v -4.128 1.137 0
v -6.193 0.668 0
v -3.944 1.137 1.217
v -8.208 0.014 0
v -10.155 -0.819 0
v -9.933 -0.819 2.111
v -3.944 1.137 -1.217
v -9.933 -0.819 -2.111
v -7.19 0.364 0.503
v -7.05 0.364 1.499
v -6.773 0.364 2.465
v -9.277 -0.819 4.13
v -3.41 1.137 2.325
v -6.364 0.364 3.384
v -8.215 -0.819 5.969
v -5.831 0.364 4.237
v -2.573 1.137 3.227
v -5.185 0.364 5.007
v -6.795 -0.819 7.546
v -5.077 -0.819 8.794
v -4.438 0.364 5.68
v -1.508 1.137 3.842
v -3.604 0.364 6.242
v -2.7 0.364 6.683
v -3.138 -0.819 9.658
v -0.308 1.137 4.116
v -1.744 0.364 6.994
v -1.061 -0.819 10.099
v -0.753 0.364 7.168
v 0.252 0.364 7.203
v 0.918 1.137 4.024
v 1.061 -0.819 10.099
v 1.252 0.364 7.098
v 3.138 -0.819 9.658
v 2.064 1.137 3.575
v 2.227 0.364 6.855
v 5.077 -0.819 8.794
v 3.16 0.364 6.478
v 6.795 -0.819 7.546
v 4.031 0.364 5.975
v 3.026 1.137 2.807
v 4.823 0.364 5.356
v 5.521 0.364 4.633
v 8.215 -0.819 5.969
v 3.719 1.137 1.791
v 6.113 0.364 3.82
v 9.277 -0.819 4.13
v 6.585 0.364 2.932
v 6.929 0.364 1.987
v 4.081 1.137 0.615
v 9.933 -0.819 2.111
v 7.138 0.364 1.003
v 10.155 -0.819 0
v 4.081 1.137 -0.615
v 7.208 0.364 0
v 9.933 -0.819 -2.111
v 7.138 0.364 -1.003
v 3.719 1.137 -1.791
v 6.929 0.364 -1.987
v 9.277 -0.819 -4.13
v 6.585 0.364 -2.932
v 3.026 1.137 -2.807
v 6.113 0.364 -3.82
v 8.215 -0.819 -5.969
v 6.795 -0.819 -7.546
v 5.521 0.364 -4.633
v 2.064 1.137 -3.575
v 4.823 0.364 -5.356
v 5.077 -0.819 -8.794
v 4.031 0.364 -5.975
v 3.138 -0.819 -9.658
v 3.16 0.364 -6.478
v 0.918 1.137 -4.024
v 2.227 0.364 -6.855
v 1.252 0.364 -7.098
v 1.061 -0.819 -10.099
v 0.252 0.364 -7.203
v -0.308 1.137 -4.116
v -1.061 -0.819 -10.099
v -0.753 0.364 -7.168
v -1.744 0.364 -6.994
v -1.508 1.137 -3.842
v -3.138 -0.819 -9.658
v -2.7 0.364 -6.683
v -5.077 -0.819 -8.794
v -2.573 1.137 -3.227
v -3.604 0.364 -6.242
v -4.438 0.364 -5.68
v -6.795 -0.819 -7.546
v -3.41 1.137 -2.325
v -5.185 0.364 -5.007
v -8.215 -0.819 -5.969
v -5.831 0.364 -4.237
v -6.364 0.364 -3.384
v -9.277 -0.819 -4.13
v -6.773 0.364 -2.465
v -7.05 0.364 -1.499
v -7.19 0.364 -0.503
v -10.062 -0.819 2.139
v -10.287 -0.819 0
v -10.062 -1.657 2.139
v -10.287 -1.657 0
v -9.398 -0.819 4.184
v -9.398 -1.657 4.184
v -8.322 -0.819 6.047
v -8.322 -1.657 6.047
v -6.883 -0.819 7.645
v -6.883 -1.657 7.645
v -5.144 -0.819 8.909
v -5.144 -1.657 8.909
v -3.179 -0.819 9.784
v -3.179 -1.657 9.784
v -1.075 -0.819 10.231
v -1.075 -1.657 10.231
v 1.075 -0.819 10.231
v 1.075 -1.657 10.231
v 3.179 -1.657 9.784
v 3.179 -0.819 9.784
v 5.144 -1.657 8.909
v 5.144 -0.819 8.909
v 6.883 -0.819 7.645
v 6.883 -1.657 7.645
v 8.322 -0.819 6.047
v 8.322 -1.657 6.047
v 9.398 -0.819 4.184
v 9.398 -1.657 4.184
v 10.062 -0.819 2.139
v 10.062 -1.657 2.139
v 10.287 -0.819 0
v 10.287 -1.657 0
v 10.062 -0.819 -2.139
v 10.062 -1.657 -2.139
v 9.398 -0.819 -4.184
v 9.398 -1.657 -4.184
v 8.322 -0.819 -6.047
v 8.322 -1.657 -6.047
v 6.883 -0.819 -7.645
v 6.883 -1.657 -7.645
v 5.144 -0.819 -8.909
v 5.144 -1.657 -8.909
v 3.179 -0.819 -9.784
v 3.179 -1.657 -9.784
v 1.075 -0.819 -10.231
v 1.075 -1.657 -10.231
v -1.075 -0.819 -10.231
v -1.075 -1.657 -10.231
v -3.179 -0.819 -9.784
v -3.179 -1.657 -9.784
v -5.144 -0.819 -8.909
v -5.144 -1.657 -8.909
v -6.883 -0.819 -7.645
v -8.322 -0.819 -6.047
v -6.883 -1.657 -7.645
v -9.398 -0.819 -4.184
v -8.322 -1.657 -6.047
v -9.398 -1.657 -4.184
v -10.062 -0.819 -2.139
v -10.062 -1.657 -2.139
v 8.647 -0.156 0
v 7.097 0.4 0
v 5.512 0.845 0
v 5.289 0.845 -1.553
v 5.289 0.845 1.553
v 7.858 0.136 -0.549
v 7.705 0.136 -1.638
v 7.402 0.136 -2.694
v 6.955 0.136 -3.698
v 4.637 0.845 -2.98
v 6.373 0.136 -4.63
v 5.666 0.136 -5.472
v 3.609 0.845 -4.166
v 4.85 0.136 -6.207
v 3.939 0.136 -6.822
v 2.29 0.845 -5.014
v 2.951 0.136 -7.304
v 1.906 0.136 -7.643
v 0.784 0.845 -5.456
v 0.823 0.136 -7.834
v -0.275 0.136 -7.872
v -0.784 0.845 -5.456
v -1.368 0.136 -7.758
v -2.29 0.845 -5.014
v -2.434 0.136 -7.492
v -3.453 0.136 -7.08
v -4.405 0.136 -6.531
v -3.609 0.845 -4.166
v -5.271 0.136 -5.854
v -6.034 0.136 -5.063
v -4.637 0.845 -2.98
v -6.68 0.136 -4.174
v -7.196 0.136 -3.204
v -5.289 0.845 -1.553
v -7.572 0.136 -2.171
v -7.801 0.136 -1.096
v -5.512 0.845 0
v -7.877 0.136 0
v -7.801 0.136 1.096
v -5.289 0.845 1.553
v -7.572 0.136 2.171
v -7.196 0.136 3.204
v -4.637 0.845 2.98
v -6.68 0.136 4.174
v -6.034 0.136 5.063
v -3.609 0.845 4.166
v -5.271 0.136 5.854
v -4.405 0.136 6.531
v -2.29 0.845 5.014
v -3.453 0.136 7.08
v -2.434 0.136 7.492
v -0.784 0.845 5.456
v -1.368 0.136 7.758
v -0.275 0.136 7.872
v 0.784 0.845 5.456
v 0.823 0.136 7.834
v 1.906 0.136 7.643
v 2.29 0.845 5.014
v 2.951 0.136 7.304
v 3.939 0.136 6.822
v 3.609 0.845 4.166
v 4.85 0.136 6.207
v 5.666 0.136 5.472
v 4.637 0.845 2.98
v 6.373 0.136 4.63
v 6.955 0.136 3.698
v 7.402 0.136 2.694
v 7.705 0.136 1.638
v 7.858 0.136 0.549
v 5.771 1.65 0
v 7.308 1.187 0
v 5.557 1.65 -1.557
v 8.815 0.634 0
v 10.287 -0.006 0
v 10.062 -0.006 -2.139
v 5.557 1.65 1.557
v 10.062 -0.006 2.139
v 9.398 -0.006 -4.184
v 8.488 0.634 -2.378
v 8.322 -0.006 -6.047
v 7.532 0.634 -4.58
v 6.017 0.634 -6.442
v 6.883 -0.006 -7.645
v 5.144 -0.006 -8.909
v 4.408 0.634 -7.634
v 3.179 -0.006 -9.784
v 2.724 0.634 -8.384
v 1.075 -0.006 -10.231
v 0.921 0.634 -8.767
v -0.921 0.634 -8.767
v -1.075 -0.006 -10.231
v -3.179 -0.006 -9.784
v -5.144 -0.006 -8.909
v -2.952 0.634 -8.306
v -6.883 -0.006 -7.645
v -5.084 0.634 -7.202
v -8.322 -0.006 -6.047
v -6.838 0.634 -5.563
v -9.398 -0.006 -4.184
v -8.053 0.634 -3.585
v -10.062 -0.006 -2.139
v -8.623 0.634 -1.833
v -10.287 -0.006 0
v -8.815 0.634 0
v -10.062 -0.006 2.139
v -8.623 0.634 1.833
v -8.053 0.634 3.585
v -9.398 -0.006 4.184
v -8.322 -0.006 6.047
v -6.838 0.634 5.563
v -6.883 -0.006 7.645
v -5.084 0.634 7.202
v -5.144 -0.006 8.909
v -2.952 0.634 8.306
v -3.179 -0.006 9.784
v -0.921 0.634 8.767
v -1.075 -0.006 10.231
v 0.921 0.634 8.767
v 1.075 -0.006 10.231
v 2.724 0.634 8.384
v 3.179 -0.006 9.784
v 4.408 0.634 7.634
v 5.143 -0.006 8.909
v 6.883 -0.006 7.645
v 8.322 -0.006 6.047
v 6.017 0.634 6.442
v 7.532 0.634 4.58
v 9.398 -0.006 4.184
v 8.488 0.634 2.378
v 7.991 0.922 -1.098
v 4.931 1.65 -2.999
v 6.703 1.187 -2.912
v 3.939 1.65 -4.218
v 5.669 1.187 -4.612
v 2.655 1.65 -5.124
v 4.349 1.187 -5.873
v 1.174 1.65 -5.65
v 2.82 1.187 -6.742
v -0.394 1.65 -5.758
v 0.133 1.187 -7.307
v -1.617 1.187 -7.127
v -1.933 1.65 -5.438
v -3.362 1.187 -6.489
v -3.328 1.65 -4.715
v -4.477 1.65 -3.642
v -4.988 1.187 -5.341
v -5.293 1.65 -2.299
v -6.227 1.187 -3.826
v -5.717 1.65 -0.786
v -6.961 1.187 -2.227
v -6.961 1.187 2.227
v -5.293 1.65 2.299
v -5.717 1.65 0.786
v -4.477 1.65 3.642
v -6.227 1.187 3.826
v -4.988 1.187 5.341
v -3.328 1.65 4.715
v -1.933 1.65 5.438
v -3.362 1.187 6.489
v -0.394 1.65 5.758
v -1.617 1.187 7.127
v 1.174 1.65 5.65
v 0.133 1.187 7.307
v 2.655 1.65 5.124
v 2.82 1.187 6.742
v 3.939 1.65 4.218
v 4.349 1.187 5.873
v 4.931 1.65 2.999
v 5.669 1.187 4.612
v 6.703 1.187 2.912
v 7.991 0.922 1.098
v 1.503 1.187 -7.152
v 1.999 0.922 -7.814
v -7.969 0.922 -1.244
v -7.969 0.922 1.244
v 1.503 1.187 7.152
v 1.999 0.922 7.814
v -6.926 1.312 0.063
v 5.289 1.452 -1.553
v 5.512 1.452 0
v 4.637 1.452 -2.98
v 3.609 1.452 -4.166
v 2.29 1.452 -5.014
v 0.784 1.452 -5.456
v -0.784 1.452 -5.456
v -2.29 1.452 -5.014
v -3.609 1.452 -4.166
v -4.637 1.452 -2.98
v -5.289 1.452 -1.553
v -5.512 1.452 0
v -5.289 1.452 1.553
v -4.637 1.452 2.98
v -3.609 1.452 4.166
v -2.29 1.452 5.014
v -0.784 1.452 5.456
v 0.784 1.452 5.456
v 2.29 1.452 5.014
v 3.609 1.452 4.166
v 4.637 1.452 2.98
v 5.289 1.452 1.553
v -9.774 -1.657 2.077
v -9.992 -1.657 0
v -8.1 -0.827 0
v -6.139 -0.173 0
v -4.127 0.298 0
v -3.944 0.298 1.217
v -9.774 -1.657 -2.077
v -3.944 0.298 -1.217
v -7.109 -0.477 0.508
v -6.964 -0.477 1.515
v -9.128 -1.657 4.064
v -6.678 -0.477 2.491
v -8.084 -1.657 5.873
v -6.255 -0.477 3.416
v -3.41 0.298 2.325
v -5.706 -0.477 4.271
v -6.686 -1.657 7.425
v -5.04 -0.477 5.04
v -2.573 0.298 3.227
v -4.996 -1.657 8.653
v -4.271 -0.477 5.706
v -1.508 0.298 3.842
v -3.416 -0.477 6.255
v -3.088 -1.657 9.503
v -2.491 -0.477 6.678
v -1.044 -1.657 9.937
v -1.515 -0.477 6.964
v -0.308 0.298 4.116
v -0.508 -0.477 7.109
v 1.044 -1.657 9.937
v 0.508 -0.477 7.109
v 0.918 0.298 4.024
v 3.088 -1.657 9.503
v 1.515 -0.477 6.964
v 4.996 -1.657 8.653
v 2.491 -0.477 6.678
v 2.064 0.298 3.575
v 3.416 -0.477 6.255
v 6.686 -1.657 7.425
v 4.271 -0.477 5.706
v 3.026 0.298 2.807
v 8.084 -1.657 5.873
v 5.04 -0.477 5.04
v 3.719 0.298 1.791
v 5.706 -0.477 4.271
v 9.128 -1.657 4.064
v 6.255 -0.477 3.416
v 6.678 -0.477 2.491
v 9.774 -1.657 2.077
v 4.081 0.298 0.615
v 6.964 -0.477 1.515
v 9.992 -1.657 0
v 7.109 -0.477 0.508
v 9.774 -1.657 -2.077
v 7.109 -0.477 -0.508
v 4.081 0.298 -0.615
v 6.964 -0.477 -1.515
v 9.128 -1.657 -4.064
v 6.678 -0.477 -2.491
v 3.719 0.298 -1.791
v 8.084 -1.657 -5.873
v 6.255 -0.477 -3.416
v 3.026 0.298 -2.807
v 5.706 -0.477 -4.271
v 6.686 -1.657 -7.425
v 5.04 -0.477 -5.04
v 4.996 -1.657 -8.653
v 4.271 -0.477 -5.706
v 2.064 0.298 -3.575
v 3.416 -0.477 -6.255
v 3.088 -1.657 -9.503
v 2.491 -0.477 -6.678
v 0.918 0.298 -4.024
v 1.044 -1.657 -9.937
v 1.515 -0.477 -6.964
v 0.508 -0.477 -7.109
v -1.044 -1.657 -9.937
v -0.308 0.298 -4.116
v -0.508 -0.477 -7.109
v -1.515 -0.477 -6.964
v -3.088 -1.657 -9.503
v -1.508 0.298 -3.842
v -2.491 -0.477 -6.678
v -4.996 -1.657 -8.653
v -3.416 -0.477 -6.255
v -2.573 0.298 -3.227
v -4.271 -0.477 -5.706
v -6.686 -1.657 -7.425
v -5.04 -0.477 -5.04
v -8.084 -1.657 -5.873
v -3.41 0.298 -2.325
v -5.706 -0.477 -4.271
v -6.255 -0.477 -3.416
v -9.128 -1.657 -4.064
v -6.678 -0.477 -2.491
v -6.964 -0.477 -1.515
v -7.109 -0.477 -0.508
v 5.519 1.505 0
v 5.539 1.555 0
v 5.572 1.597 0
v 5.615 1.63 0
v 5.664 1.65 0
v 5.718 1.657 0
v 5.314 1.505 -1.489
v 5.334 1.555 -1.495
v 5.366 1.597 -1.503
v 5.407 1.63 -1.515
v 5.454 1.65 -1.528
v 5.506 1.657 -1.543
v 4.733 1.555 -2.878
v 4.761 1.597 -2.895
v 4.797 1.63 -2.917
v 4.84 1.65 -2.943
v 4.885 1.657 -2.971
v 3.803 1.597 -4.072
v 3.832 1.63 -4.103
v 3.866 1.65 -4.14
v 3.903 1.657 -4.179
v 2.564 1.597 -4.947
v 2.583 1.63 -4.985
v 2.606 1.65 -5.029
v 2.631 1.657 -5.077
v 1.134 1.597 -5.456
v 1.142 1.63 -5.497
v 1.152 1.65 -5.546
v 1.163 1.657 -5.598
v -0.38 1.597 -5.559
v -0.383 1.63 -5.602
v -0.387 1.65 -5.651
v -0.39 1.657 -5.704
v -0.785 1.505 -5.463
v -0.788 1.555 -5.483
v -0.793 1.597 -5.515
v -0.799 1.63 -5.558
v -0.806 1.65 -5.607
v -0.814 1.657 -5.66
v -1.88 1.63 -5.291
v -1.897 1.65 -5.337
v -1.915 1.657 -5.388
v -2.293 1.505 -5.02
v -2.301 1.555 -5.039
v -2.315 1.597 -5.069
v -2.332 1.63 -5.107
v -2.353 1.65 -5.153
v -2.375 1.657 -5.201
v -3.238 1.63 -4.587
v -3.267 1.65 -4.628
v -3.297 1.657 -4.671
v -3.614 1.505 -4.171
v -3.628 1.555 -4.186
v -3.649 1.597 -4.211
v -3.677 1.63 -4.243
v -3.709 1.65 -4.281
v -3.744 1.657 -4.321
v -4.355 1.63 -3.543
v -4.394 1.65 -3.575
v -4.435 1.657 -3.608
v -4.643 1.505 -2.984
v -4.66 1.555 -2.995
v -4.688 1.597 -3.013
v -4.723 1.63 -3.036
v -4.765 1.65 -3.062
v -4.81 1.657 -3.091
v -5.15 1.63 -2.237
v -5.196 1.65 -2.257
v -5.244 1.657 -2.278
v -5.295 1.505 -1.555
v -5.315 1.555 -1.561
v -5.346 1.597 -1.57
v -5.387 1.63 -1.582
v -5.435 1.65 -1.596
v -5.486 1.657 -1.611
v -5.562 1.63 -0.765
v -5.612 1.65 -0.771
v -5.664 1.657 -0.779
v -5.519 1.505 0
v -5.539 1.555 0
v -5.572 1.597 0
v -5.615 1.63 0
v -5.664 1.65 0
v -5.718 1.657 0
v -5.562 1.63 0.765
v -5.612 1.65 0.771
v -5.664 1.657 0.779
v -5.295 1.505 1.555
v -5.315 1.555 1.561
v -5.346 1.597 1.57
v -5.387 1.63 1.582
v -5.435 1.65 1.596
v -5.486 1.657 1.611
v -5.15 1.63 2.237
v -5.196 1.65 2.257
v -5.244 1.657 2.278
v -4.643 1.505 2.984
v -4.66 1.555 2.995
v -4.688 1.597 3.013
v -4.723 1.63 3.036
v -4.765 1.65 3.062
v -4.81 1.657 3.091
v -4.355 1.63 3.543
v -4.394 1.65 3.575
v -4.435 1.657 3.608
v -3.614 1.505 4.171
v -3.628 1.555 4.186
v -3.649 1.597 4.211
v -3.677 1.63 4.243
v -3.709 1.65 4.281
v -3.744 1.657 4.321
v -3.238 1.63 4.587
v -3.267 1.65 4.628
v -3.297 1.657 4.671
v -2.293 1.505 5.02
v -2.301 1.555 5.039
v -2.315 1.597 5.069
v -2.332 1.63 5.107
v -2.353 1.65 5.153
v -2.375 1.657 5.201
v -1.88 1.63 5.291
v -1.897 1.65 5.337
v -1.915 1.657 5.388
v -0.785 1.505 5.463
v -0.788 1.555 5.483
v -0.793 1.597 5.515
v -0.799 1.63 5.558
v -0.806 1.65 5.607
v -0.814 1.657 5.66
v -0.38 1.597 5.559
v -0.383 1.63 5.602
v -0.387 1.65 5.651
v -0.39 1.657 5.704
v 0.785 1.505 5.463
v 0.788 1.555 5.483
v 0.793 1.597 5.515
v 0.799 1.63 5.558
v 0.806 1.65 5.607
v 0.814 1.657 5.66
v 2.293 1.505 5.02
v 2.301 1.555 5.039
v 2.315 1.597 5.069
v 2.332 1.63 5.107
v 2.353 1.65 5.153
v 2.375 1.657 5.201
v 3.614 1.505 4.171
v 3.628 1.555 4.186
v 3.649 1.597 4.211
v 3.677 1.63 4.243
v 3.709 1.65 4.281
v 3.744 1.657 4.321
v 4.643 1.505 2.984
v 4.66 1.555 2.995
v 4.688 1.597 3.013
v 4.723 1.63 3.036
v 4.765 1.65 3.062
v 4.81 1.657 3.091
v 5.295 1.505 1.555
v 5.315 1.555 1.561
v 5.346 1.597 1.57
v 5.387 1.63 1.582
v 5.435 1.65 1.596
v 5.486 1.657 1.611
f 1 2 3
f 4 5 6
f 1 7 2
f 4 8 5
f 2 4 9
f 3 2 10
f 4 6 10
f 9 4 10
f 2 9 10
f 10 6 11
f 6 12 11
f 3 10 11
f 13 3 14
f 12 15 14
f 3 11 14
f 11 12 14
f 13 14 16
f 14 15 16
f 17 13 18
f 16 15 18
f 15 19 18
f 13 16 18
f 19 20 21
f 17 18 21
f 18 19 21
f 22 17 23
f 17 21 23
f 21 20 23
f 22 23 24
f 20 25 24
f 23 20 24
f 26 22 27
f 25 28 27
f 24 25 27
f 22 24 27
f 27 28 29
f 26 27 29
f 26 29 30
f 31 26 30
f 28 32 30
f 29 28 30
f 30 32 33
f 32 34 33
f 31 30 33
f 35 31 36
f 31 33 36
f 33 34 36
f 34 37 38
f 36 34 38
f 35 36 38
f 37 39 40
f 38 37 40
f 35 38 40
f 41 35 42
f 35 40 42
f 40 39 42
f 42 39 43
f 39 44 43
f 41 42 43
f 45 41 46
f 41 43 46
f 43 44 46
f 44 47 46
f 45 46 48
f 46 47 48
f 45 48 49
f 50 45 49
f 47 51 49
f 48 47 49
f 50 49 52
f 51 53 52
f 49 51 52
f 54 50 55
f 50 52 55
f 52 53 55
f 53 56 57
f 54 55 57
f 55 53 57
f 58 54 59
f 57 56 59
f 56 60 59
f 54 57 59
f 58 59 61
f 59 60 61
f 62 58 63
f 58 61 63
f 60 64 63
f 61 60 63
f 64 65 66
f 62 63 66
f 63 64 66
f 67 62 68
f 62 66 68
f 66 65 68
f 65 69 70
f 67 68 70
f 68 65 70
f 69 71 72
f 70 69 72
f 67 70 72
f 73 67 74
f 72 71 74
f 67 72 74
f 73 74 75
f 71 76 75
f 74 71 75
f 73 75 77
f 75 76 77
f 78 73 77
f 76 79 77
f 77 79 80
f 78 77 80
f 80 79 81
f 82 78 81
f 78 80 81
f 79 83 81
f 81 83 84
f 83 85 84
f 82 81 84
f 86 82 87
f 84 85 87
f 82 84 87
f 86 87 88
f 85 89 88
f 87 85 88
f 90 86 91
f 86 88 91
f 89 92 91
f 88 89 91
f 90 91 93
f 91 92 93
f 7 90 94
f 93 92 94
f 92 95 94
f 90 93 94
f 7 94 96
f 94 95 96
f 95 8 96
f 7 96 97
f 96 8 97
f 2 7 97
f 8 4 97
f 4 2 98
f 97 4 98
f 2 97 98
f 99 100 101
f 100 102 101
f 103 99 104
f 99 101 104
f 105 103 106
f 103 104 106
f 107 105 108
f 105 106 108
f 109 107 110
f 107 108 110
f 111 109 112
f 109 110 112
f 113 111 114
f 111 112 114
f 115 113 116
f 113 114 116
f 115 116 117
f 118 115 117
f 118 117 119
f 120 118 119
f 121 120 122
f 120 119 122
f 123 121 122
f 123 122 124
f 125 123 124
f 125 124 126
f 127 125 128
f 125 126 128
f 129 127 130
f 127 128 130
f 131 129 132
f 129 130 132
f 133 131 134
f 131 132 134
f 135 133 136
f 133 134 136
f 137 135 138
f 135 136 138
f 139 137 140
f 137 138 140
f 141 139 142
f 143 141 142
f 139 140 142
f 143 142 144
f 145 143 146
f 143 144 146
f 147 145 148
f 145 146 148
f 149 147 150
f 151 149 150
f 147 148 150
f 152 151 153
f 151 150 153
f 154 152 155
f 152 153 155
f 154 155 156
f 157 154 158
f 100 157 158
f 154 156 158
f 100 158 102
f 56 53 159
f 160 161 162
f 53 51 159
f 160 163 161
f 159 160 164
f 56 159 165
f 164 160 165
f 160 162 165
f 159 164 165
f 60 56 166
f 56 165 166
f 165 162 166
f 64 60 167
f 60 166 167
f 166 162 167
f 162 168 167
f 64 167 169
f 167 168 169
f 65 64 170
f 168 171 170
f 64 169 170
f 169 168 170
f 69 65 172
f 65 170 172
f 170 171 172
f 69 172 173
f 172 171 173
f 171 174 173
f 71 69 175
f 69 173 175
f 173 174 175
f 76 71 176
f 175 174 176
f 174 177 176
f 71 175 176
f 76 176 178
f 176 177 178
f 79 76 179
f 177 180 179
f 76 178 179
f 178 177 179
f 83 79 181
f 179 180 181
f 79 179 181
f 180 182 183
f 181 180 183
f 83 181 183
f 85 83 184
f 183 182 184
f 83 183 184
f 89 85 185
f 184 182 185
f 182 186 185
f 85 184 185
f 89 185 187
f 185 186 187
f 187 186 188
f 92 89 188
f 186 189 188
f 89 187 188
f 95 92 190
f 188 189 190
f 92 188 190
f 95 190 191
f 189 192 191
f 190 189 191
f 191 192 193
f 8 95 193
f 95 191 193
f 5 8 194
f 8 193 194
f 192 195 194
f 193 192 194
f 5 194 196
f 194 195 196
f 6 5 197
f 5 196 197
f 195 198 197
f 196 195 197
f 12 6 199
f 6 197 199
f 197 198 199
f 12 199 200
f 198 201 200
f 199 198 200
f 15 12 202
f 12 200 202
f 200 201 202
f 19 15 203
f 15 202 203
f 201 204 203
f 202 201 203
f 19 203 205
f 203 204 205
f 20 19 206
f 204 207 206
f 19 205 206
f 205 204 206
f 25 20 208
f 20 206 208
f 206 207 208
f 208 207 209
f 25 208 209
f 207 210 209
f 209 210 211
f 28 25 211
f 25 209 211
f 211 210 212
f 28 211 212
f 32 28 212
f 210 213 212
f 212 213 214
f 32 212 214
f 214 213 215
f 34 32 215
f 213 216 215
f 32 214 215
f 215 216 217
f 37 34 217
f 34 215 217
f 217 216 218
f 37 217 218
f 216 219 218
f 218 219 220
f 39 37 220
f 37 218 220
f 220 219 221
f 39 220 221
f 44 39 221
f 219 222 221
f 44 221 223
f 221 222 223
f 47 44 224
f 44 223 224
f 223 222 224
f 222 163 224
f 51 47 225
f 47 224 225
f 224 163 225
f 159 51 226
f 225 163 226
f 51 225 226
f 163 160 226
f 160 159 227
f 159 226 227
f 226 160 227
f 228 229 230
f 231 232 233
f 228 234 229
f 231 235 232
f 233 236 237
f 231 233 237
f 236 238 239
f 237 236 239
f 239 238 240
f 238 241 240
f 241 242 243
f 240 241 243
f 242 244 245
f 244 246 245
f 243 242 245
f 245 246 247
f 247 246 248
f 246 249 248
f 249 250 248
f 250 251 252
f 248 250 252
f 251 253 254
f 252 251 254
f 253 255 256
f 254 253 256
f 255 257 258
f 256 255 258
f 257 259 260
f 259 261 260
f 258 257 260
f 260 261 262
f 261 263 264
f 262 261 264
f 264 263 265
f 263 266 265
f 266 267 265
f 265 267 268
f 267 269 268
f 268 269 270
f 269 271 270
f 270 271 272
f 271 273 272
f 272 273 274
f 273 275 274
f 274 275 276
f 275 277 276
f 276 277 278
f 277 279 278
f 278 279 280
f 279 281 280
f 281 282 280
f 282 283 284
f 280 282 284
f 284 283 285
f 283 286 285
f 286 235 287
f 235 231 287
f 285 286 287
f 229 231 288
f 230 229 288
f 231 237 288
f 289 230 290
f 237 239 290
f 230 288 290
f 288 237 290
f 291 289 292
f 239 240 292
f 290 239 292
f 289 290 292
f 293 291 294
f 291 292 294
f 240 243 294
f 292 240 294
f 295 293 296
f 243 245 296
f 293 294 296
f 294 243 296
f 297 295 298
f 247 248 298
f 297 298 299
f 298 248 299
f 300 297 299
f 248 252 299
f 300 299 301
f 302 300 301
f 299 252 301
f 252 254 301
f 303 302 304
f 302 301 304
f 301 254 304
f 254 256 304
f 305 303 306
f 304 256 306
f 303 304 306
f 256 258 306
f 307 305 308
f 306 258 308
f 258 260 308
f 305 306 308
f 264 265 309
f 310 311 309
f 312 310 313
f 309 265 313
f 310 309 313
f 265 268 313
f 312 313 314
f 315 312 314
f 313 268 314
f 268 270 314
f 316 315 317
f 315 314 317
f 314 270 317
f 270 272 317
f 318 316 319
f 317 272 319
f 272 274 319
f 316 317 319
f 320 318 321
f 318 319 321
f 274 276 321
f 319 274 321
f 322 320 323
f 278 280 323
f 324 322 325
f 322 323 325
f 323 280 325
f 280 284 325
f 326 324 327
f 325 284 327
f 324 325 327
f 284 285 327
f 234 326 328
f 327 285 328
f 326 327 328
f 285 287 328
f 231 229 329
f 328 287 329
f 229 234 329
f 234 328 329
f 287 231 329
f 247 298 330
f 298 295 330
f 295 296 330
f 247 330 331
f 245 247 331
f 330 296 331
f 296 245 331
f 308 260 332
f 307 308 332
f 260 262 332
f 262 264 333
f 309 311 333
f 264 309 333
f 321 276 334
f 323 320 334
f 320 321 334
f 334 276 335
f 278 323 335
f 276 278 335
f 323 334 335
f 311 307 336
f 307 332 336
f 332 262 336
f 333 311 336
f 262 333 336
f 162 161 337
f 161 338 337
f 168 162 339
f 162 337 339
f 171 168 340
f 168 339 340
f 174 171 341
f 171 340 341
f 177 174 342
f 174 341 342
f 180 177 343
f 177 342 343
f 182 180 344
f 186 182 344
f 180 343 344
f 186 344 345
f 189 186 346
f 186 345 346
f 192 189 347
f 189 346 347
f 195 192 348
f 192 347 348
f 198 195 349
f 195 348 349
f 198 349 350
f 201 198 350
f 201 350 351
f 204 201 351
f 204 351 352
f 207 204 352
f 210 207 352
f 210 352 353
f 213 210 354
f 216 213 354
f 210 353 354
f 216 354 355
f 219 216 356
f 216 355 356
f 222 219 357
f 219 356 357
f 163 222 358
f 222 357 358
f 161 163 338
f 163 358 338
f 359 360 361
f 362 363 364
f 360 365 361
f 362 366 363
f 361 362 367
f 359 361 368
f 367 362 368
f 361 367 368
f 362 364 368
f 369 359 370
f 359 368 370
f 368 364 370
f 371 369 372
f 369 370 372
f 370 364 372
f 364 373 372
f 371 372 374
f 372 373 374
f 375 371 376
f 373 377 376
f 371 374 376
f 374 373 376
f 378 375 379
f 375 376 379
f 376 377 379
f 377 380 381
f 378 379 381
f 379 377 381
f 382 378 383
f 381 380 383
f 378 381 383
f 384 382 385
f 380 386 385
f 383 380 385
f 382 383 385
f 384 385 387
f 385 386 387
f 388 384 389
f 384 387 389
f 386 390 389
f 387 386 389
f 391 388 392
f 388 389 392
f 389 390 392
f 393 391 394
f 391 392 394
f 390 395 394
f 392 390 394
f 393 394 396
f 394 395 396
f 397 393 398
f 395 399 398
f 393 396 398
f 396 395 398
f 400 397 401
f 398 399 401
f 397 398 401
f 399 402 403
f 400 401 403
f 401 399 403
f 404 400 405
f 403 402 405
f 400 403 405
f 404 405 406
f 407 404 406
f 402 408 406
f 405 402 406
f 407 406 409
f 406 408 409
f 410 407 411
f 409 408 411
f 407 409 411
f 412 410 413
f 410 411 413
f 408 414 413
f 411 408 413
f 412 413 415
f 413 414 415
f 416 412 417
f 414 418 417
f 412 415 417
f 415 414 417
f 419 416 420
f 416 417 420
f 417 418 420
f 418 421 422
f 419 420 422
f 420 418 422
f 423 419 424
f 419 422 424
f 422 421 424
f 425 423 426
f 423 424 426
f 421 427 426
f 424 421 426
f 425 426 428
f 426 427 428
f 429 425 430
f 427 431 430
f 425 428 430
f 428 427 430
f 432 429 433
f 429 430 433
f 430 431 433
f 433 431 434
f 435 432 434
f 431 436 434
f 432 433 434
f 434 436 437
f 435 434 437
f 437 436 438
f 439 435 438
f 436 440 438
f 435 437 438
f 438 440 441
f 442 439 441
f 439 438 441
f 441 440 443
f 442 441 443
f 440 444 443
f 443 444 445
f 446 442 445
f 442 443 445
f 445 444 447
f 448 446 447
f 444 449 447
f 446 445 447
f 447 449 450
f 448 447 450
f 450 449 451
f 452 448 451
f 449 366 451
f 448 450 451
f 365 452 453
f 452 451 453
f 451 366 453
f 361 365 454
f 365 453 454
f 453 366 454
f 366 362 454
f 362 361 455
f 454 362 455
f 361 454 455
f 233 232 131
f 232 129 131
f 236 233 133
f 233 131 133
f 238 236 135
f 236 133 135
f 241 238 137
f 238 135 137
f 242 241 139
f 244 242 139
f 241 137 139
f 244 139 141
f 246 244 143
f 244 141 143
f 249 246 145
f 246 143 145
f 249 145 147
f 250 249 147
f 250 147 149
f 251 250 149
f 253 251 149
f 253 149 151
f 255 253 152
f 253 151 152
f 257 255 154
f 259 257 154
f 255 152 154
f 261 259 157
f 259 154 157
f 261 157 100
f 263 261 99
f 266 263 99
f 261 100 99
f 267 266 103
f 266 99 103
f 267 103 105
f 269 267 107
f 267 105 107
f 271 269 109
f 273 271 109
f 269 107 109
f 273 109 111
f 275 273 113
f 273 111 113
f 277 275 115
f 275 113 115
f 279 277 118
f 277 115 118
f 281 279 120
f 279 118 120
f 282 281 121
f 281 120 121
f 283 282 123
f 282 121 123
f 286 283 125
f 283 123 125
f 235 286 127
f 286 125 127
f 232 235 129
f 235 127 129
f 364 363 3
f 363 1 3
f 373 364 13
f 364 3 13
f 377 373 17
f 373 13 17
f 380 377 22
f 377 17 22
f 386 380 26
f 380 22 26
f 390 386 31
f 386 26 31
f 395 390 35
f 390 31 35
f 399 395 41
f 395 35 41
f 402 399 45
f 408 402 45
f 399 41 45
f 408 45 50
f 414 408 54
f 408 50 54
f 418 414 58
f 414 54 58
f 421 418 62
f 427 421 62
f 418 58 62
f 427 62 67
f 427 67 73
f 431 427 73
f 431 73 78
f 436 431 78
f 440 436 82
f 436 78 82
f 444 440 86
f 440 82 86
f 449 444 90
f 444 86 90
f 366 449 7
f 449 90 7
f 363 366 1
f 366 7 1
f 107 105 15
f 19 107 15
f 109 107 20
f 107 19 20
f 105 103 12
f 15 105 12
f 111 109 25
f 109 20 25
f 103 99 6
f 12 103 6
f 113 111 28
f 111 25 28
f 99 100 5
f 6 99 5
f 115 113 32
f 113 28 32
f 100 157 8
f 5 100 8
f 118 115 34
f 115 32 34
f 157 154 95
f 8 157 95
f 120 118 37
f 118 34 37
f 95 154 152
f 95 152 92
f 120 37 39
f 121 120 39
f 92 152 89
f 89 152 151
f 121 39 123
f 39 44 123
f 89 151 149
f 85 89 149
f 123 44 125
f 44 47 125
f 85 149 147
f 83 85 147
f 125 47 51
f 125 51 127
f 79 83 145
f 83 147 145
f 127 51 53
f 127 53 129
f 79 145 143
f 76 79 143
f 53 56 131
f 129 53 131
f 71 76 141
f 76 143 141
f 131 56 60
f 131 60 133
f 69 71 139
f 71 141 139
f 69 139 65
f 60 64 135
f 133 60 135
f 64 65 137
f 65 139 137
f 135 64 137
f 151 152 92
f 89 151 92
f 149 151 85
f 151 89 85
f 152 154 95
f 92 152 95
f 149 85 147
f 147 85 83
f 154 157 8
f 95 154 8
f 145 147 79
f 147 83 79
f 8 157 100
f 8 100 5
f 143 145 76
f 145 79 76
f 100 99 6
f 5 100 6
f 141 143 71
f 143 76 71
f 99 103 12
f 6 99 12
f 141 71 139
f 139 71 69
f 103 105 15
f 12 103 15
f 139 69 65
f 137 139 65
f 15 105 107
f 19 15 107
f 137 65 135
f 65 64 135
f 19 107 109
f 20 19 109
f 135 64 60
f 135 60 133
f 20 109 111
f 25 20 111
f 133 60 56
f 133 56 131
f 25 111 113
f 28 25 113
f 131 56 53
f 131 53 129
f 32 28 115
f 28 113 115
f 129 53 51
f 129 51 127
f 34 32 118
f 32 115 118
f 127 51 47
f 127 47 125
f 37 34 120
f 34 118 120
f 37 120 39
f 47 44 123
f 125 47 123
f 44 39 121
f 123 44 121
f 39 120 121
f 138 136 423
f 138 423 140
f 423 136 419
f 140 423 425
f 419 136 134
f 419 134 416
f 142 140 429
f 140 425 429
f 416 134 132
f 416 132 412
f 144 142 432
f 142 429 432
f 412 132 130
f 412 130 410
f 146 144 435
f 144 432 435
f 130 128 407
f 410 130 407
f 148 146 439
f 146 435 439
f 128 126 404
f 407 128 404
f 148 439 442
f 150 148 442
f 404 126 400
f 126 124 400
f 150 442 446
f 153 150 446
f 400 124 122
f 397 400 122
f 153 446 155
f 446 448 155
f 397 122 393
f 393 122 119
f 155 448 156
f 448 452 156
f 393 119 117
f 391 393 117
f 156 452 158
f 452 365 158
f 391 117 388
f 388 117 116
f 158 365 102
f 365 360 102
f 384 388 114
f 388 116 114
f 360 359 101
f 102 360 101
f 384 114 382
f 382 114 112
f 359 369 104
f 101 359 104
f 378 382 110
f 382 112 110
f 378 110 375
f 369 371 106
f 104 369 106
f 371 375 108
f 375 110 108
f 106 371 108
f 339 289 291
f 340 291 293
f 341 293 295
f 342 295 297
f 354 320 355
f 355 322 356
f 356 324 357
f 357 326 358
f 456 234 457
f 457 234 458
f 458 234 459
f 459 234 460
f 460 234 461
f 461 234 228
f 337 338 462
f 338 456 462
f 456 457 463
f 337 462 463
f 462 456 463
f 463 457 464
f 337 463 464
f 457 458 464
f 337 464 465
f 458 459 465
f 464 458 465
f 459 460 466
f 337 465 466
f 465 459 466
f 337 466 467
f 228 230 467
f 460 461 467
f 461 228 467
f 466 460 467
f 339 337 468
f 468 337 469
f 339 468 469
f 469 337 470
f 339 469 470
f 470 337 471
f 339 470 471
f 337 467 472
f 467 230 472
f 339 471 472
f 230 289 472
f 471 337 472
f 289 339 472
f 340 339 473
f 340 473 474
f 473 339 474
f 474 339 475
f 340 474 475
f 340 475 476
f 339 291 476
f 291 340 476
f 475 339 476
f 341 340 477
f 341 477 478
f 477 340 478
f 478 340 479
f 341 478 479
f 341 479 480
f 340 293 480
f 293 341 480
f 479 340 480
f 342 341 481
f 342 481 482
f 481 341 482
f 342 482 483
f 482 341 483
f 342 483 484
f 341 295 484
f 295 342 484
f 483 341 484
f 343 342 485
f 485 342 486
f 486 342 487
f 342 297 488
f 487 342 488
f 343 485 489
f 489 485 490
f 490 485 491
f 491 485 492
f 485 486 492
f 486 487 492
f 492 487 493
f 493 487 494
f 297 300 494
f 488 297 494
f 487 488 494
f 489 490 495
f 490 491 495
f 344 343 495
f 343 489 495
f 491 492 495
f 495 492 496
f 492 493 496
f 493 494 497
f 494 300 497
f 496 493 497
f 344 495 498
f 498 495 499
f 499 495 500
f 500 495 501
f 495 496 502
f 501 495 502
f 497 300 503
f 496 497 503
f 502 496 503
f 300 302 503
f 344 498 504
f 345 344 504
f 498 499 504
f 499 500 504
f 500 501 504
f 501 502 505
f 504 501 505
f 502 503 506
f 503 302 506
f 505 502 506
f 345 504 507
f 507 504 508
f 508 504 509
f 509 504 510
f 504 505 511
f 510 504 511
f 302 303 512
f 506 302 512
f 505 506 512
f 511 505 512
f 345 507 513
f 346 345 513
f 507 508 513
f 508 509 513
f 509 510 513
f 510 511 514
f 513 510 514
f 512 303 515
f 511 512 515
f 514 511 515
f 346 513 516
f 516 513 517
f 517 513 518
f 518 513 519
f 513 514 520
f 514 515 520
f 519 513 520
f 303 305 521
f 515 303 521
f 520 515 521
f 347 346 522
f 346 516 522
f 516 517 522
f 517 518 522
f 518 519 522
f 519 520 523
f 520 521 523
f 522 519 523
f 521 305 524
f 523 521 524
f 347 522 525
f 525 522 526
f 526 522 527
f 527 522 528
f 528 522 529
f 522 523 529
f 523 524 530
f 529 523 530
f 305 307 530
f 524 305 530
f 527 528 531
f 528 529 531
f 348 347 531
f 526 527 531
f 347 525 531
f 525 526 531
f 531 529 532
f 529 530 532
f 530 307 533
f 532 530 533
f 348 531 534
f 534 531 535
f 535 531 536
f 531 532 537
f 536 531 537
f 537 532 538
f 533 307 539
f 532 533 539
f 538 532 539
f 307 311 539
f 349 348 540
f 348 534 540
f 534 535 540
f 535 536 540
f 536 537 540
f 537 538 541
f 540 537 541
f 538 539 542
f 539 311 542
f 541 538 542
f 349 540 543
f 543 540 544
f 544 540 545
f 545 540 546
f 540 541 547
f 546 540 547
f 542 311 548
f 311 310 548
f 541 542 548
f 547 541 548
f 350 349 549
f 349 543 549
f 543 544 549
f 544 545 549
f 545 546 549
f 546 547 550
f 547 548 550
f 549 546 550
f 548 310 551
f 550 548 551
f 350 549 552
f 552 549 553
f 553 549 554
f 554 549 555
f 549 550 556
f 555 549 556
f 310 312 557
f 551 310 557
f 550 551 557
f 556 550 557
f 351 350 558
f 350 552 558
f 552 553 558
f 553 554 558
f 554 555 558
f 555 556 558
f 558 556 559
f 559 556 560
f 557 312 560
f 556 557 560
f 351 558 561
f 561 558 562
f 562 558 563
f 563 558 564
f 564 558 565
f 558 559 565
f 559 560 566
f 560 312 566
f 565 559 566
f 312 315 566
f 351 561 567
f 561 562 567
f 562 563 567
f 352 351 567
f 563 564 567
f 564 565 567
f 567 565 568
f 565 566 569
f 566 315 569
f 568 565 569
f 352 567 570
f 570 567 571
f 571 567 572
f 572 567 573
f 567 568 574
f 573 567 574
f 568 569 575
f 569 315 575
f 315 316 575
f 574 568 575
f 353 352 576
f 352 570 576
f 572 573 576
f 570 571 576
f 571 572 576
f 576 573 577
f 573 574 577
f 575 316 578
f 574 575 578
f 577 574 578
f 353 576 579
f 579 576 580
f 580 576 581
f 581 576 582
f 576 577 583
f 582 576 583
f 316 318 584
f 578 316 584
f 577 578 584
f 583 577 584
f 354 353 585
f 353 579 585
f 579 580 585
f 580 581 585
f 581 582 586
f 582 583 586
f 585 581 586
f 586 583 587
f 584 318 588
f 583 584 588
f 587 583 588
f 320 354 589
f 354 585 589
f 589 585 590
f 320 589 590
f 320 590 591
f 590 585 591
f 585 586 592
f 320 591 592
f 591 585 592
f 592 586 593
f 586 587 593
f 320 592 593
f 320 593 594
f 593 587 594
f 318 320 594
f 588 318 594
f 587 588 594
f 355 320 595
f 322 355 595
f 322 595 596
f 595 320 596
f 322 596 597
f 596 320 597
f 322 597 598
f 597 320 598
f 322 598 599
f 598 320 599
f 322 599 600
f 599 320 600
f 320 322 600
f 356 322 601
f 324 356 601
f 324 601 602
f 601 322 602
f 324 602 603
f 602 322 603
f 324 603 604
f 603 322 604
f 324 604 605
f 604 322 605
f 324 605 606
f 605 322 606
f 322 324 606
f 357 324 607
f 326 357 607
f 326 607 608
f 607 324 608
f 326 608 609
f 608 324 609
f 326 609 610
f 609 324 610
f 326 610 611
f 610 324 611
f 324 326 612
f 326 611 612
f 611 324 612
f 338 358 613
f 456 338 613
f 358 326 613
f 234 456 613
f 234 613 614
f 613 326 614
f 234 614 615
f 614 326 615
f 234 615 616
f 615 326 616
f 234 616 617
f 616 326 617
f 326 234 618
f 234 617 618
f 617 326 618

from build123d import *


with BuildPart() as part:
    # Sketch6 → Revolve3 (revolve)
    with BuildSketch(Plane.XY, mode=Mode.PRIVATE) as revolve3_sk:
        with BuildLine():
            Line((-10.287, -0.00635), (-10.287, -0.81915))
            Line((-10.287, -0.81915), (-10.154696366, -0.81915))
            ThreePointArc((-10.154696366, -0.81915), (-7.877293413, 0.135617256), (-5.5118, 0.84455))
            Line((-5.5118, 0.84455), (-5.5118, 1.45161))
            ThreePointArc((-5.5118, 1.45161), (-5.592392955, 1.614910841), (-5.771031697, 1.650274506))
            ThreePointArc((-5.771031697, 1.650274506), (-8.065724276, 0.922029647), (-10.287, -0.00635))
        make_face()
    revolve(revolve3_sk.sketch.rotate(Axis((0, -1.65735, 0), (0, 1, 0)), 180), axis=Axis((0, -1.65735, 0), (0, 1, 0)))


with BuildPart() as body_2:
    # Sketch7 → Revolve4 (revolve)
    with BuildSketch(Plane.XY):
        with BuildLine():
            Line((-10.287, -0.81915), (-10.287, -1.65735))
            Line((-10.287, -1.65735), (-9.991951576, -1.65735))
            ThreePointArc((-9.991951576, -1.65735), (-7.127134835, -0.477310553), (-4.1275, 0.298485114))
            Line((-4.1275, 0.298485114), (-4.1275, 1.136685114))
            ThreePointArc((-4.1275, 1.136685114), (-7.20774625, 0.364153474), (-10.154696366, -0.81915))
            Line((-10.154696366, -0.81915), (-10.287, -0.81915))
        make_face()
    revolve(axis=Axis((0, -1.65735, 0), (0, 1, 0)))


solid = Compound([part.part, body_2.part])
